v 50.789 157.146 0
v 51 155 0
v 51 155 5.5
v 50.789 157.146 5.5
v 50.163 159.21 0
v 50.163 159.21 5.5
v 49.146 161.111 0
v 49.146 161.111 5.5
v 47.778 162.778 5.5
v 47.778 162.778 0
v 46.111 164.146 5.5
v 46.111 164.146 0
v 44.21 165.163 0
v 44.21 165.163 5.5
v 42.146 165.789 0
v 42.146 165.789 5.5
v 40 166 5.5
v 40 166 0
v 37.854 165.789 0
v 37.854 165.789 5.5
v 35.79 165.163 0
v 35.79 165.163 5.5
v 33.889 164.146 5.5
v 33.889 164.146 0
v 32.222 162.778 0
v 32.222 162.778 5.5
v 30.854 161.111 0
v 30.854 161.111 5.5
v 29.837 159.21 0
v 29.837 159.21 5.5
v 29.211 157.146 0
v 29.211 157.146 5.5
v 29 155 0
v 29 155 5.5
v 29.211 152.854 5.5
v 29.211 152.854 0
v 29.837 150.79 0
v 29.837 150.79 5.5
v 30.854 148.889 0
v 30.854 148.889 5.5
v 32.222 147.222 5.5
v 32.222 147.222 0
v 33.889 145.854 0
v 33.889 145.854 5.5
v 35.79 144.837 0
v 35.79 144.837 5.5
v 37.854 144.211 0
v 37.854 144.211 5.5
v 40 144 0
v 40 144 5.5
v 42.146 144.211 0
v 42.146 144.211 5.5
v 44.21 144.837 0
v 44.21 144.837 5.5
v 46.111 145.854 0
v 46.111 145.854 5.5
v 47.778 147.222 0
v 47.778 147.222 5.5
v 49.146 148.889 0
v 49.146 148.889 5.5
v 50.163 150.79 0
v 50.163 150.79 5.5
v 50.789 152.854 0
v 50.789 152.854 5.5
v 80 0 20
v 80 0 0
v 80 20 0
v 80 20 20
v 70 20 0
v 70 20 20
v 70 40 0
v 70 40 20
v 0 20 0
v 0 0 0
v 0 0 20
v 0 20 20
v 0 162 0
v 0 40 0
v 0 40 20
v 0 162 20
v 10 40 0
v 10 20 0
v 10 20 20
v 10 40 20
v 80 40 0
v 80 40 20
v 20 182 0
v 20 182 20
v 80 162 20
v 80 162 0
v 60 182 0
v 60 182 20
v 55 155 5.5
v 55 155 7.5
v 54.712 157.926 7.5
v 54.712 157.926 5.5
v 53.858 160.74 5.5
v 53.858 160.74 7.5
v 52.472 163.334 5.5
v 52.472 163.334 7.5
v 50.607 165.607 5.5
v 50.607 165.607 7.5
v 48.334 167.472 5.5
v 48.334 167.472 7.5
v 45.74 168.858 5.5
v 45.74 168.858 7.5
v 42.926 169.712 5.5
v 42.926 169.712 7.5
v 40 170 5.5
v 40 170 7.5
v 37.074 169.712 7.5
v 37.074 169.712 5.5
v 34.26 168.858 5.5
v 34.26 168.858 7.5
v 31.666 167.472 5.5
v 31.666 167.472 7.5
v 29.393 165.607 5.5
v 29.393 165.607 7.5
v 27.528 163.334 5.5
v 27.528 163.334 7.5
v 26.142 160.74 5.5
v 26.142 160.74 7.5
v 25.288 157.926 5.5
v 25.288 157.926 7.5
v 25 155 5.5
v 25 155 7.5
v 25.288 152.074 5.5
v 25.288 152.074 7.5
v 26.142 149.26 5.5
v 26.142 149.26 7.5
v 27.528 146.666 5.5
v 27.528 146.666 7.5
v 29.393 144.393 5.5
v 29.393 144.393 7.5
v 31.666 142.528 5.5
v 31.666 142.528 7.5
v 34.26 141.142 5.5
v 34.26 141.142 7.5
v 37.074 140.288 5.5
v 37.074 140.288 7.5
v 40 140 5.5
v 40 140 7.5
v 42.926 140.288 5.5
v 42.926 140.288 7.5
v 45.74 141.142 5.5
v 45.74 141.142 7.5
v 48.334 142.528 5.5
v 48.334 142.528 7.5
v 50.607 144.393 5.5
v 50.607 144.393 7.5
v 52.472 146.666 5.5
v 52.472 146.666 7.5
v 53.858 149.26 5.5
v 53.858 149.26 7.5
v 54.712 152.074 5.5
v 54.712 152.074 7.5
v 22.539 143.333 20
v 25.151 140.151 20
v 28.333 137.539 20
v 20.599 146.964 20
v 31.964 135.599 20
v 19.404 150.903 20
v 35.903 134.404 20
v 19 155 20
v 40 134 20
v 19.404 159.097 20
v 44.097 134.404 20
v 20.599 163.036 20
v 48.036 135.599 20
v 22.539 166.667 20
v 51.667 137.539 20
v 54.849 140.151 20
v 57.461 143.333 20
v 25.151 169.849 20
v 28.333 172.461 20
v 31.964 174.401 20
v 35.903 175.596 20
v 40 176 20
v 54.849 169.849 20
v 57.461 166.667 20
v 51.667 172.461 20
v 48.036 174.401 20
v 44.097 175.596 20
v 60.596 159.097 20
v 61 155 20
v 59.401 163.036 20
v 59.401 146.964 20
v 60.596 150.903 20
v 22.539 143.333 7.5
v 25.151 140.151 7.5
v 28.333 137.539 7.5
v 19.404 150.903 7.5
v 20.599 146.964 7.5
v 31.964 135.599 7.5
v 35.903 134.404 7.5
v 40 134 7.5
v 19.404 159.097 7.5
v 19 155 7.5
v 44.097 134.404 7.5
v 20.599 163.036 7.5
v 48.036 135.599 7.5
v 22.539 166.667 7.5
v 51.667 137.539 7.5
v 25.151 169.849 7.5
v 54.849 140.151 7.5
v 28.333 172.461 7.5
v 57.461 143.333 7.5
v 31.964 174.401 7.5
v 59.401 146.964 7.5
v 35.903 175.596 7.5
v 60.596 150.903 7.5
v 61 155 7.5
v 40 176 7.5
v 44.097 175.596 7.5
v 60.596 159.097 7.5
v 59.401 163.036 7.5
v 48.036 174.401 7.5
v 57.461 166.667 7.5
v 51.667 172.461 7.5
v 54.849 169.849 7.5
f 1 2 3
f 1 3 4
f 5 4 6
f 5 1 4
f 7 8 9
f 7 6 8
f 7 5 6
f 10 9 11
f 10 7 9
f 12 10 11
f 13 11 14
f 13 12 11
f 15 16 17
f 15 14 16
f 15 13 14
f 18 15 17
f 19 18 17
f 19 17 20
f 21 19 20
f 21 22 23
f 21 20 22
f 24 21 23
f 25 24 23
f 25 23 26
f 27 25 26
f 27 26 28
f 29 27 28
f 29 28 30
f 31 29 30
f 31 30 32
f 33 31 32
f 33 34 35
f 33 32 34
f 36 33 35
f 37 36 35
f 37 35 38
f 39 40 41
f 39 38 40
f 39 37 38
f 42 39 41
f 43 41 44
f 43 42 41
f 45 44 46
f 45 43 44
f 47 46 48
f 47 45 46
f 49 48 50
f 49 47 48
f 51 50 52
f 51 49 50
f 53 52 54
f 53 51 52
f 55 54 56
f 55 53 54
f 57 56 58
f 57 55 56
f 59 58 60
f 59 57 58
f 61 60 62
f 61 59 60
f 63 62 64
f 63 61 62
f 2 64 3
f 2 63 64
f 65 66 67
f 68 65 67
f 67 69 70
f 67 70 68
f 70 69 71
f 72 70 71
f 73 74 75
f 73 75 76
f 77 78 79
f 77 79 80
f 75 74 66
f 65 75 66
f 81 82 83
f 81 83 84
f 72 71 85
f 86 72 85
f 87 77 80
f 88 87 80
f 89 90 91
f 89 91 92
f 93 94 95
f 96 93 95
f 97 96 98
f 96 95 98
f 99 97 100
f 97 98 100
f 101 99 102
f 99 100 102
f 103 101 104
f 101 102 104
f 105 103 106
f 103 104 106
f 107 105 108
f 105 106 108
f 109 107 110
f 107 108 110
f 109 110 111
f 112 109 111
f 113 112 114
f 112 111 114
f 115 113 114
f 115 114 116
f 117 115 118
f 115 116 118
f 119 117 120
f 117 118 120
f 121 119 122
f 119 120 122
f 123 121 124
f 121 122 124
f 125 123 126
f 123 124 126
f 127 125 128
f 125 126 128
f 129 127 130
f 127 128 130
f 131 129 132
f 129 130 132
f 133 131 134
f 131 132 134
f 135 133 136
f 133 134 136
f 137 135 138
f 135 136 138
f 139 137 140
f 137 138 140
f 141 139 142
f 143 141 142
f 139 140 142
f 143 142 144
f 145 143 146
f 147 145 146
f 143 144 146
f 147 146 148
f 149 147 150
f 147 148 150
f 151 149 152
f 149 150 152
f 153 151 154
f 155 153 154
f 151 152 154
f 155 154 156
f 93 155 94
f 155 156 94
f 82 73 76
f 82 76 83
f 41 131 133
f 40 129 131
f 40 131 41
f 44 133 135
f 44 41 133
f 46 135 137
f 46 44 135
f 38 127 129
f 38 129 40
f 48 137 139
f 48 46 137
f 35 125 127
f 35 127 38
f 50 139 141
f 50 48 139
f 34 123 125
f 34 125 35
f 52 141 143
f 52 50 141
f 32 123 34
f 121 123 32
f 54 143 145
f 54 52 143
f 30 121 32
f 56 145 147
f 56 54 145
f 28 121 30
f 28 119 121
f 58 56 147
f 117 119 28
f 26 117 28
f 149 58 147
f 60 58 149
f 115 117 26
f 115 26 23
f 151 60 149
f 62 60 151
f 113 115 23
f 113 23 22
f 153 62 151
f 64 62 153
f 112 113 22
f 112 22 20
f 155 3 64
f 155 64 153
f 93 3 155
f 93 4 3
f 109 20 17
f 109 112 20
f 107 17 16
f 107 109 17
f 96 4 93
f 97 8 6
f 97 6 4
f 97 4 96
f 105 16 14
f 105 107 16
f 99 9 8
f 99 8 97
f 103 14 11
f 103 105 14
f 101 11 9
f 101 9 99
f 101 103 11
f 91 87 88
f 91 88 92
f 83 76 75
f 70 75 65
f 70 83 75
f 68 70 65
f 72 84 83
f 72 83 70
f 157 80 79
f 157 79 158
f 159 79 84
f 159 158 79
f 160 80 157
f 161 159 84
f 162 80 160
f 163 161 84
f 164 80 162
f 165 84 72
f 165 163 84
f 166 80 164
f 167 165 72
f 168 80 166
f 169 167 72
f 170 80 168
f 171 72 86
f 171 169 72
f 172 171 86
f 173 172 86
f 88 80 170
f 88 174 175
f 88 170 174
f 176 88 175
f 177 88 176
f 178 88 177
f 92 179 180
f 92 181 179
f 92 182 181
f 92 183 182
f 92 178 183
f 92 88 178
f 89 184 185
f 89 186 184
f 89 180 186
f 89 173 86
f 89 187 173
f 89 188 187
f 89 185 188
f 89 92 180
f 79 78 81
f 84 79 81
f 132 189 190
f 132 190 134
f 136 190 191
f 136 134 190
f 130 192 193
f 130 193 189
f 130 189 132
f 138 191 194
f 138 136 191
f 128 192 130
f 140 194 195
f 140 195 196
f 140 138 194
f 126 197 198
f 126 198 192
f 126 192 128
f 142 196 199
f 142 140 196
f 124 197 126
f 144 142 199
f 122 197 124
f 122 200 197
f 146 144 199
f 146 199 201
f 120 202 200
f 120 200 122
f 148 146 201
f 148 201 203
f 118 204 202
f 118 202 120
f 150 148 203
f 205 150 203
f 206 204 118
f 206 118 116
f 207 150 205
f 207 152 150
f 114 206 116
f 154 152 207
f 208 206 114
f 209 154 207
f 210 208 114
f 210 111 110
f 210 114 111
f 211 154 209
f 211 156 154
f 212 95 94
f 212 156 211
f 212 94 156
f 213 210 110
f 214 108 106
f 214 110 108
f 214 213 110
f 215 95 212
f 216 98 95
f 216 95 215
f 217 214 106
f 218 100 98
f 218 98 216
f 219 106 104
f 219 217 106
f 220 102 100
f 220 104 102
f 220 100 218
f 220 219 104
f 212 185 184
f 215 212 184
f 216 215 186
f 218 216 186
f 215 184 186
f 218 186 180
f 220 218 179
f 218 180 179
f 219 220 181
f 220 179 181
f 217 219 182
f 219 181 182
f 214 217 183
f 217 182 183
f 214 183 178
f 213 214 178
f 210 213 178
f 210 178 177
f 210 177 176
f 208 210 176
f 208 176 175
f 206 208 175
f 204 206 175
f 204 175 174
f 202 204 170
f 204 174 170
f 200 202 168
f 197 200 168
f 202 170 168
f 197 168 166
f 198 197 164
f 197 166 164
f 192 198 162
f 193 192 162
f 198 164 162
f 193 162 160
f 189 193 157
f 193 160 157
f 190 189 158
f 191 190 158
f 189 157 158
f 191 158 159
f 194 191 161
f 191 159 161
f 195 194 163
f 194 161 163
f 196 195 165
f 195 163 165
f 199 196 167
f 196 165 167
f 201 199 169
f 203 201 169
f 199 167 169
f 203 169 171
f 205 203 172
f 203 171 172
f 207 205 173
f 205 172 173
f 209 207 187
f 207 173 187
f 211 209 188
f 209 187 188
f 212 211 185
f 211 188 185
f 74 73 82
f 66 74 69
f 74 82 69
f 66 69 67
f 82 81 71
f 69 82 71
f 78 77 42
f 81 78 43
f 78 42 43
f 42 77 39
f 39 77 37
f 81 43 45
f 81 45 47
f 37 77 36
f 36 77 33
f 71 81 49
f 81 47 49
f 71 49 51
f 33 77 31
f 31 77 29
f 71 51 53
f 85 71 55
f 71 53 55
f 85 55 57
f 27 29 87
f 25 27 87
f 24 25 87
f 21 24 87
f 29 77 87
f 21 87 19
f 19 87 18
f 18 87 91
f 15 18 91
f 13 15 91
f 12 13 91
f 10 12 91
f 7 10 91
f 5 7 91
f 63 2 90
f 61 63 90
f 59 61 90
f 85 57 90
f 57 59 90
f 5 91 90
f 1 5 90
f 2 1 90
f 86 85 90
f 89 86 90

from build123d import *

# Parameters (mm, degrees)
ESQUISSE1_W                  = 80
ESQUISSE1_H                  = 182
BOSS_EXTRU_1_DEPTH           = 20
ENL_V_MAT_EXTRU_1_DEPTH      = 200.809909664
ENL_V_MAT_EXTRU_1_DEPTH_BACK = 200.809909664
ESQUISSE2_R                  = 11
CHANFREIN1_SIZE              = 20
ESQUISSE3_R                  = 21
ENL_V_MAT_EXTRU_2_DEPTH      = 12.5
ESQUISSE4_R                  = 15
ENL_V_MAT_EXTRU_3_DEPTH      = 2
ENL_V_MAT_EXTRU_4_DEPTH      = 200.809909664
ENL_V_MAT_EXTRU_4_DEPTH_BACK = 200.809909664
ESQUISSE5_W                  = 10
ESQUISSE5_H                  = 20


with BuildPart() as part:
    # Esquisse1 → Boss.-Extru.1 (new body)
    with BuildSketch(Plane.XY):
        with Locations((40, 91)):
            Rectangle(ESQUISSE1_W, ESQUISSE1_H)
    extrude(amount=BOSS_EXTRU_1_DEPTH)

    # Esquisse2 → Enlèv. mat.-Extru.1 (cut, two sides: drawn at the far end of the back side and taken through both)
    with BuildSketch(Plane.XY.offset(20).offset(-ENL_V_MAT_EXTRU_1_DEPTH_BACK)):
        with Locations((40, 155)):
            Circle(ESQUISSE2_R)
    extrude(amount=ENL_V_MAT_EXTRU_1_DEPTH + ENL_V_MAT_EXTRU_1_DEPTH_BACK, mode=Mode.SUBTRACT)

    # Chanfrein1
    chanfrein1_edges = [part.edges().sort_by_distance(p)[0] for p in [
        (0, 182, 10),
        (80, 182, 10),
    ]]
    chamfer(chanfrein1_edges, length=CHANFREIN1_SIZE)

    # Esquisse3 → Enlèv. mat.-Extru.2 (cut)
    with BuildSketch(Plane.XY.offset(20)):
        with Locations((40, 155)):
            Circle(ESQUISSE3_R)
    extrude(amount=-ENL_V_MAT_EXTRU_2_DEPTH, mode=Mode.SUBTRACT)

    # Esquisse4 → Enlèv. mat.-Extru.3 (cut)
    with BuildSketch(Plane.XY.offset(7.5)):
        with Locations((40, 155)):
            Circle(ESQUISSE4_R)
    extrude(amount=-ENL_V_MAT_EXTRU_3_DEPTH, mode=Mode.SUBTRACT)

    # Esquisse5 → Enlèv. mat.-Extru.4 (cut, two sides: drawn at the far end of the back side and taken through both)
    with BuildSketch(Plane.XY.offset(20).offset(-ENL_V_MAT_EXTRU_4_DEPTH_BACK)):
        with Locations((75, 30)):
            Rectangle(ESQUISSE5_W, ESQUISSE5_H)
        with Locations((5, 30)):
            Rectangle(ESQUISSE5_W, ESQUISSE5_H)
    extrude(amount=ENL_V_MAT_EXTRU_4_DEPTH + ENL_V_MAT_EXTRU_4_DEPTH_BACK, mode=Mode.SUBTRACT)


solid = part.part
